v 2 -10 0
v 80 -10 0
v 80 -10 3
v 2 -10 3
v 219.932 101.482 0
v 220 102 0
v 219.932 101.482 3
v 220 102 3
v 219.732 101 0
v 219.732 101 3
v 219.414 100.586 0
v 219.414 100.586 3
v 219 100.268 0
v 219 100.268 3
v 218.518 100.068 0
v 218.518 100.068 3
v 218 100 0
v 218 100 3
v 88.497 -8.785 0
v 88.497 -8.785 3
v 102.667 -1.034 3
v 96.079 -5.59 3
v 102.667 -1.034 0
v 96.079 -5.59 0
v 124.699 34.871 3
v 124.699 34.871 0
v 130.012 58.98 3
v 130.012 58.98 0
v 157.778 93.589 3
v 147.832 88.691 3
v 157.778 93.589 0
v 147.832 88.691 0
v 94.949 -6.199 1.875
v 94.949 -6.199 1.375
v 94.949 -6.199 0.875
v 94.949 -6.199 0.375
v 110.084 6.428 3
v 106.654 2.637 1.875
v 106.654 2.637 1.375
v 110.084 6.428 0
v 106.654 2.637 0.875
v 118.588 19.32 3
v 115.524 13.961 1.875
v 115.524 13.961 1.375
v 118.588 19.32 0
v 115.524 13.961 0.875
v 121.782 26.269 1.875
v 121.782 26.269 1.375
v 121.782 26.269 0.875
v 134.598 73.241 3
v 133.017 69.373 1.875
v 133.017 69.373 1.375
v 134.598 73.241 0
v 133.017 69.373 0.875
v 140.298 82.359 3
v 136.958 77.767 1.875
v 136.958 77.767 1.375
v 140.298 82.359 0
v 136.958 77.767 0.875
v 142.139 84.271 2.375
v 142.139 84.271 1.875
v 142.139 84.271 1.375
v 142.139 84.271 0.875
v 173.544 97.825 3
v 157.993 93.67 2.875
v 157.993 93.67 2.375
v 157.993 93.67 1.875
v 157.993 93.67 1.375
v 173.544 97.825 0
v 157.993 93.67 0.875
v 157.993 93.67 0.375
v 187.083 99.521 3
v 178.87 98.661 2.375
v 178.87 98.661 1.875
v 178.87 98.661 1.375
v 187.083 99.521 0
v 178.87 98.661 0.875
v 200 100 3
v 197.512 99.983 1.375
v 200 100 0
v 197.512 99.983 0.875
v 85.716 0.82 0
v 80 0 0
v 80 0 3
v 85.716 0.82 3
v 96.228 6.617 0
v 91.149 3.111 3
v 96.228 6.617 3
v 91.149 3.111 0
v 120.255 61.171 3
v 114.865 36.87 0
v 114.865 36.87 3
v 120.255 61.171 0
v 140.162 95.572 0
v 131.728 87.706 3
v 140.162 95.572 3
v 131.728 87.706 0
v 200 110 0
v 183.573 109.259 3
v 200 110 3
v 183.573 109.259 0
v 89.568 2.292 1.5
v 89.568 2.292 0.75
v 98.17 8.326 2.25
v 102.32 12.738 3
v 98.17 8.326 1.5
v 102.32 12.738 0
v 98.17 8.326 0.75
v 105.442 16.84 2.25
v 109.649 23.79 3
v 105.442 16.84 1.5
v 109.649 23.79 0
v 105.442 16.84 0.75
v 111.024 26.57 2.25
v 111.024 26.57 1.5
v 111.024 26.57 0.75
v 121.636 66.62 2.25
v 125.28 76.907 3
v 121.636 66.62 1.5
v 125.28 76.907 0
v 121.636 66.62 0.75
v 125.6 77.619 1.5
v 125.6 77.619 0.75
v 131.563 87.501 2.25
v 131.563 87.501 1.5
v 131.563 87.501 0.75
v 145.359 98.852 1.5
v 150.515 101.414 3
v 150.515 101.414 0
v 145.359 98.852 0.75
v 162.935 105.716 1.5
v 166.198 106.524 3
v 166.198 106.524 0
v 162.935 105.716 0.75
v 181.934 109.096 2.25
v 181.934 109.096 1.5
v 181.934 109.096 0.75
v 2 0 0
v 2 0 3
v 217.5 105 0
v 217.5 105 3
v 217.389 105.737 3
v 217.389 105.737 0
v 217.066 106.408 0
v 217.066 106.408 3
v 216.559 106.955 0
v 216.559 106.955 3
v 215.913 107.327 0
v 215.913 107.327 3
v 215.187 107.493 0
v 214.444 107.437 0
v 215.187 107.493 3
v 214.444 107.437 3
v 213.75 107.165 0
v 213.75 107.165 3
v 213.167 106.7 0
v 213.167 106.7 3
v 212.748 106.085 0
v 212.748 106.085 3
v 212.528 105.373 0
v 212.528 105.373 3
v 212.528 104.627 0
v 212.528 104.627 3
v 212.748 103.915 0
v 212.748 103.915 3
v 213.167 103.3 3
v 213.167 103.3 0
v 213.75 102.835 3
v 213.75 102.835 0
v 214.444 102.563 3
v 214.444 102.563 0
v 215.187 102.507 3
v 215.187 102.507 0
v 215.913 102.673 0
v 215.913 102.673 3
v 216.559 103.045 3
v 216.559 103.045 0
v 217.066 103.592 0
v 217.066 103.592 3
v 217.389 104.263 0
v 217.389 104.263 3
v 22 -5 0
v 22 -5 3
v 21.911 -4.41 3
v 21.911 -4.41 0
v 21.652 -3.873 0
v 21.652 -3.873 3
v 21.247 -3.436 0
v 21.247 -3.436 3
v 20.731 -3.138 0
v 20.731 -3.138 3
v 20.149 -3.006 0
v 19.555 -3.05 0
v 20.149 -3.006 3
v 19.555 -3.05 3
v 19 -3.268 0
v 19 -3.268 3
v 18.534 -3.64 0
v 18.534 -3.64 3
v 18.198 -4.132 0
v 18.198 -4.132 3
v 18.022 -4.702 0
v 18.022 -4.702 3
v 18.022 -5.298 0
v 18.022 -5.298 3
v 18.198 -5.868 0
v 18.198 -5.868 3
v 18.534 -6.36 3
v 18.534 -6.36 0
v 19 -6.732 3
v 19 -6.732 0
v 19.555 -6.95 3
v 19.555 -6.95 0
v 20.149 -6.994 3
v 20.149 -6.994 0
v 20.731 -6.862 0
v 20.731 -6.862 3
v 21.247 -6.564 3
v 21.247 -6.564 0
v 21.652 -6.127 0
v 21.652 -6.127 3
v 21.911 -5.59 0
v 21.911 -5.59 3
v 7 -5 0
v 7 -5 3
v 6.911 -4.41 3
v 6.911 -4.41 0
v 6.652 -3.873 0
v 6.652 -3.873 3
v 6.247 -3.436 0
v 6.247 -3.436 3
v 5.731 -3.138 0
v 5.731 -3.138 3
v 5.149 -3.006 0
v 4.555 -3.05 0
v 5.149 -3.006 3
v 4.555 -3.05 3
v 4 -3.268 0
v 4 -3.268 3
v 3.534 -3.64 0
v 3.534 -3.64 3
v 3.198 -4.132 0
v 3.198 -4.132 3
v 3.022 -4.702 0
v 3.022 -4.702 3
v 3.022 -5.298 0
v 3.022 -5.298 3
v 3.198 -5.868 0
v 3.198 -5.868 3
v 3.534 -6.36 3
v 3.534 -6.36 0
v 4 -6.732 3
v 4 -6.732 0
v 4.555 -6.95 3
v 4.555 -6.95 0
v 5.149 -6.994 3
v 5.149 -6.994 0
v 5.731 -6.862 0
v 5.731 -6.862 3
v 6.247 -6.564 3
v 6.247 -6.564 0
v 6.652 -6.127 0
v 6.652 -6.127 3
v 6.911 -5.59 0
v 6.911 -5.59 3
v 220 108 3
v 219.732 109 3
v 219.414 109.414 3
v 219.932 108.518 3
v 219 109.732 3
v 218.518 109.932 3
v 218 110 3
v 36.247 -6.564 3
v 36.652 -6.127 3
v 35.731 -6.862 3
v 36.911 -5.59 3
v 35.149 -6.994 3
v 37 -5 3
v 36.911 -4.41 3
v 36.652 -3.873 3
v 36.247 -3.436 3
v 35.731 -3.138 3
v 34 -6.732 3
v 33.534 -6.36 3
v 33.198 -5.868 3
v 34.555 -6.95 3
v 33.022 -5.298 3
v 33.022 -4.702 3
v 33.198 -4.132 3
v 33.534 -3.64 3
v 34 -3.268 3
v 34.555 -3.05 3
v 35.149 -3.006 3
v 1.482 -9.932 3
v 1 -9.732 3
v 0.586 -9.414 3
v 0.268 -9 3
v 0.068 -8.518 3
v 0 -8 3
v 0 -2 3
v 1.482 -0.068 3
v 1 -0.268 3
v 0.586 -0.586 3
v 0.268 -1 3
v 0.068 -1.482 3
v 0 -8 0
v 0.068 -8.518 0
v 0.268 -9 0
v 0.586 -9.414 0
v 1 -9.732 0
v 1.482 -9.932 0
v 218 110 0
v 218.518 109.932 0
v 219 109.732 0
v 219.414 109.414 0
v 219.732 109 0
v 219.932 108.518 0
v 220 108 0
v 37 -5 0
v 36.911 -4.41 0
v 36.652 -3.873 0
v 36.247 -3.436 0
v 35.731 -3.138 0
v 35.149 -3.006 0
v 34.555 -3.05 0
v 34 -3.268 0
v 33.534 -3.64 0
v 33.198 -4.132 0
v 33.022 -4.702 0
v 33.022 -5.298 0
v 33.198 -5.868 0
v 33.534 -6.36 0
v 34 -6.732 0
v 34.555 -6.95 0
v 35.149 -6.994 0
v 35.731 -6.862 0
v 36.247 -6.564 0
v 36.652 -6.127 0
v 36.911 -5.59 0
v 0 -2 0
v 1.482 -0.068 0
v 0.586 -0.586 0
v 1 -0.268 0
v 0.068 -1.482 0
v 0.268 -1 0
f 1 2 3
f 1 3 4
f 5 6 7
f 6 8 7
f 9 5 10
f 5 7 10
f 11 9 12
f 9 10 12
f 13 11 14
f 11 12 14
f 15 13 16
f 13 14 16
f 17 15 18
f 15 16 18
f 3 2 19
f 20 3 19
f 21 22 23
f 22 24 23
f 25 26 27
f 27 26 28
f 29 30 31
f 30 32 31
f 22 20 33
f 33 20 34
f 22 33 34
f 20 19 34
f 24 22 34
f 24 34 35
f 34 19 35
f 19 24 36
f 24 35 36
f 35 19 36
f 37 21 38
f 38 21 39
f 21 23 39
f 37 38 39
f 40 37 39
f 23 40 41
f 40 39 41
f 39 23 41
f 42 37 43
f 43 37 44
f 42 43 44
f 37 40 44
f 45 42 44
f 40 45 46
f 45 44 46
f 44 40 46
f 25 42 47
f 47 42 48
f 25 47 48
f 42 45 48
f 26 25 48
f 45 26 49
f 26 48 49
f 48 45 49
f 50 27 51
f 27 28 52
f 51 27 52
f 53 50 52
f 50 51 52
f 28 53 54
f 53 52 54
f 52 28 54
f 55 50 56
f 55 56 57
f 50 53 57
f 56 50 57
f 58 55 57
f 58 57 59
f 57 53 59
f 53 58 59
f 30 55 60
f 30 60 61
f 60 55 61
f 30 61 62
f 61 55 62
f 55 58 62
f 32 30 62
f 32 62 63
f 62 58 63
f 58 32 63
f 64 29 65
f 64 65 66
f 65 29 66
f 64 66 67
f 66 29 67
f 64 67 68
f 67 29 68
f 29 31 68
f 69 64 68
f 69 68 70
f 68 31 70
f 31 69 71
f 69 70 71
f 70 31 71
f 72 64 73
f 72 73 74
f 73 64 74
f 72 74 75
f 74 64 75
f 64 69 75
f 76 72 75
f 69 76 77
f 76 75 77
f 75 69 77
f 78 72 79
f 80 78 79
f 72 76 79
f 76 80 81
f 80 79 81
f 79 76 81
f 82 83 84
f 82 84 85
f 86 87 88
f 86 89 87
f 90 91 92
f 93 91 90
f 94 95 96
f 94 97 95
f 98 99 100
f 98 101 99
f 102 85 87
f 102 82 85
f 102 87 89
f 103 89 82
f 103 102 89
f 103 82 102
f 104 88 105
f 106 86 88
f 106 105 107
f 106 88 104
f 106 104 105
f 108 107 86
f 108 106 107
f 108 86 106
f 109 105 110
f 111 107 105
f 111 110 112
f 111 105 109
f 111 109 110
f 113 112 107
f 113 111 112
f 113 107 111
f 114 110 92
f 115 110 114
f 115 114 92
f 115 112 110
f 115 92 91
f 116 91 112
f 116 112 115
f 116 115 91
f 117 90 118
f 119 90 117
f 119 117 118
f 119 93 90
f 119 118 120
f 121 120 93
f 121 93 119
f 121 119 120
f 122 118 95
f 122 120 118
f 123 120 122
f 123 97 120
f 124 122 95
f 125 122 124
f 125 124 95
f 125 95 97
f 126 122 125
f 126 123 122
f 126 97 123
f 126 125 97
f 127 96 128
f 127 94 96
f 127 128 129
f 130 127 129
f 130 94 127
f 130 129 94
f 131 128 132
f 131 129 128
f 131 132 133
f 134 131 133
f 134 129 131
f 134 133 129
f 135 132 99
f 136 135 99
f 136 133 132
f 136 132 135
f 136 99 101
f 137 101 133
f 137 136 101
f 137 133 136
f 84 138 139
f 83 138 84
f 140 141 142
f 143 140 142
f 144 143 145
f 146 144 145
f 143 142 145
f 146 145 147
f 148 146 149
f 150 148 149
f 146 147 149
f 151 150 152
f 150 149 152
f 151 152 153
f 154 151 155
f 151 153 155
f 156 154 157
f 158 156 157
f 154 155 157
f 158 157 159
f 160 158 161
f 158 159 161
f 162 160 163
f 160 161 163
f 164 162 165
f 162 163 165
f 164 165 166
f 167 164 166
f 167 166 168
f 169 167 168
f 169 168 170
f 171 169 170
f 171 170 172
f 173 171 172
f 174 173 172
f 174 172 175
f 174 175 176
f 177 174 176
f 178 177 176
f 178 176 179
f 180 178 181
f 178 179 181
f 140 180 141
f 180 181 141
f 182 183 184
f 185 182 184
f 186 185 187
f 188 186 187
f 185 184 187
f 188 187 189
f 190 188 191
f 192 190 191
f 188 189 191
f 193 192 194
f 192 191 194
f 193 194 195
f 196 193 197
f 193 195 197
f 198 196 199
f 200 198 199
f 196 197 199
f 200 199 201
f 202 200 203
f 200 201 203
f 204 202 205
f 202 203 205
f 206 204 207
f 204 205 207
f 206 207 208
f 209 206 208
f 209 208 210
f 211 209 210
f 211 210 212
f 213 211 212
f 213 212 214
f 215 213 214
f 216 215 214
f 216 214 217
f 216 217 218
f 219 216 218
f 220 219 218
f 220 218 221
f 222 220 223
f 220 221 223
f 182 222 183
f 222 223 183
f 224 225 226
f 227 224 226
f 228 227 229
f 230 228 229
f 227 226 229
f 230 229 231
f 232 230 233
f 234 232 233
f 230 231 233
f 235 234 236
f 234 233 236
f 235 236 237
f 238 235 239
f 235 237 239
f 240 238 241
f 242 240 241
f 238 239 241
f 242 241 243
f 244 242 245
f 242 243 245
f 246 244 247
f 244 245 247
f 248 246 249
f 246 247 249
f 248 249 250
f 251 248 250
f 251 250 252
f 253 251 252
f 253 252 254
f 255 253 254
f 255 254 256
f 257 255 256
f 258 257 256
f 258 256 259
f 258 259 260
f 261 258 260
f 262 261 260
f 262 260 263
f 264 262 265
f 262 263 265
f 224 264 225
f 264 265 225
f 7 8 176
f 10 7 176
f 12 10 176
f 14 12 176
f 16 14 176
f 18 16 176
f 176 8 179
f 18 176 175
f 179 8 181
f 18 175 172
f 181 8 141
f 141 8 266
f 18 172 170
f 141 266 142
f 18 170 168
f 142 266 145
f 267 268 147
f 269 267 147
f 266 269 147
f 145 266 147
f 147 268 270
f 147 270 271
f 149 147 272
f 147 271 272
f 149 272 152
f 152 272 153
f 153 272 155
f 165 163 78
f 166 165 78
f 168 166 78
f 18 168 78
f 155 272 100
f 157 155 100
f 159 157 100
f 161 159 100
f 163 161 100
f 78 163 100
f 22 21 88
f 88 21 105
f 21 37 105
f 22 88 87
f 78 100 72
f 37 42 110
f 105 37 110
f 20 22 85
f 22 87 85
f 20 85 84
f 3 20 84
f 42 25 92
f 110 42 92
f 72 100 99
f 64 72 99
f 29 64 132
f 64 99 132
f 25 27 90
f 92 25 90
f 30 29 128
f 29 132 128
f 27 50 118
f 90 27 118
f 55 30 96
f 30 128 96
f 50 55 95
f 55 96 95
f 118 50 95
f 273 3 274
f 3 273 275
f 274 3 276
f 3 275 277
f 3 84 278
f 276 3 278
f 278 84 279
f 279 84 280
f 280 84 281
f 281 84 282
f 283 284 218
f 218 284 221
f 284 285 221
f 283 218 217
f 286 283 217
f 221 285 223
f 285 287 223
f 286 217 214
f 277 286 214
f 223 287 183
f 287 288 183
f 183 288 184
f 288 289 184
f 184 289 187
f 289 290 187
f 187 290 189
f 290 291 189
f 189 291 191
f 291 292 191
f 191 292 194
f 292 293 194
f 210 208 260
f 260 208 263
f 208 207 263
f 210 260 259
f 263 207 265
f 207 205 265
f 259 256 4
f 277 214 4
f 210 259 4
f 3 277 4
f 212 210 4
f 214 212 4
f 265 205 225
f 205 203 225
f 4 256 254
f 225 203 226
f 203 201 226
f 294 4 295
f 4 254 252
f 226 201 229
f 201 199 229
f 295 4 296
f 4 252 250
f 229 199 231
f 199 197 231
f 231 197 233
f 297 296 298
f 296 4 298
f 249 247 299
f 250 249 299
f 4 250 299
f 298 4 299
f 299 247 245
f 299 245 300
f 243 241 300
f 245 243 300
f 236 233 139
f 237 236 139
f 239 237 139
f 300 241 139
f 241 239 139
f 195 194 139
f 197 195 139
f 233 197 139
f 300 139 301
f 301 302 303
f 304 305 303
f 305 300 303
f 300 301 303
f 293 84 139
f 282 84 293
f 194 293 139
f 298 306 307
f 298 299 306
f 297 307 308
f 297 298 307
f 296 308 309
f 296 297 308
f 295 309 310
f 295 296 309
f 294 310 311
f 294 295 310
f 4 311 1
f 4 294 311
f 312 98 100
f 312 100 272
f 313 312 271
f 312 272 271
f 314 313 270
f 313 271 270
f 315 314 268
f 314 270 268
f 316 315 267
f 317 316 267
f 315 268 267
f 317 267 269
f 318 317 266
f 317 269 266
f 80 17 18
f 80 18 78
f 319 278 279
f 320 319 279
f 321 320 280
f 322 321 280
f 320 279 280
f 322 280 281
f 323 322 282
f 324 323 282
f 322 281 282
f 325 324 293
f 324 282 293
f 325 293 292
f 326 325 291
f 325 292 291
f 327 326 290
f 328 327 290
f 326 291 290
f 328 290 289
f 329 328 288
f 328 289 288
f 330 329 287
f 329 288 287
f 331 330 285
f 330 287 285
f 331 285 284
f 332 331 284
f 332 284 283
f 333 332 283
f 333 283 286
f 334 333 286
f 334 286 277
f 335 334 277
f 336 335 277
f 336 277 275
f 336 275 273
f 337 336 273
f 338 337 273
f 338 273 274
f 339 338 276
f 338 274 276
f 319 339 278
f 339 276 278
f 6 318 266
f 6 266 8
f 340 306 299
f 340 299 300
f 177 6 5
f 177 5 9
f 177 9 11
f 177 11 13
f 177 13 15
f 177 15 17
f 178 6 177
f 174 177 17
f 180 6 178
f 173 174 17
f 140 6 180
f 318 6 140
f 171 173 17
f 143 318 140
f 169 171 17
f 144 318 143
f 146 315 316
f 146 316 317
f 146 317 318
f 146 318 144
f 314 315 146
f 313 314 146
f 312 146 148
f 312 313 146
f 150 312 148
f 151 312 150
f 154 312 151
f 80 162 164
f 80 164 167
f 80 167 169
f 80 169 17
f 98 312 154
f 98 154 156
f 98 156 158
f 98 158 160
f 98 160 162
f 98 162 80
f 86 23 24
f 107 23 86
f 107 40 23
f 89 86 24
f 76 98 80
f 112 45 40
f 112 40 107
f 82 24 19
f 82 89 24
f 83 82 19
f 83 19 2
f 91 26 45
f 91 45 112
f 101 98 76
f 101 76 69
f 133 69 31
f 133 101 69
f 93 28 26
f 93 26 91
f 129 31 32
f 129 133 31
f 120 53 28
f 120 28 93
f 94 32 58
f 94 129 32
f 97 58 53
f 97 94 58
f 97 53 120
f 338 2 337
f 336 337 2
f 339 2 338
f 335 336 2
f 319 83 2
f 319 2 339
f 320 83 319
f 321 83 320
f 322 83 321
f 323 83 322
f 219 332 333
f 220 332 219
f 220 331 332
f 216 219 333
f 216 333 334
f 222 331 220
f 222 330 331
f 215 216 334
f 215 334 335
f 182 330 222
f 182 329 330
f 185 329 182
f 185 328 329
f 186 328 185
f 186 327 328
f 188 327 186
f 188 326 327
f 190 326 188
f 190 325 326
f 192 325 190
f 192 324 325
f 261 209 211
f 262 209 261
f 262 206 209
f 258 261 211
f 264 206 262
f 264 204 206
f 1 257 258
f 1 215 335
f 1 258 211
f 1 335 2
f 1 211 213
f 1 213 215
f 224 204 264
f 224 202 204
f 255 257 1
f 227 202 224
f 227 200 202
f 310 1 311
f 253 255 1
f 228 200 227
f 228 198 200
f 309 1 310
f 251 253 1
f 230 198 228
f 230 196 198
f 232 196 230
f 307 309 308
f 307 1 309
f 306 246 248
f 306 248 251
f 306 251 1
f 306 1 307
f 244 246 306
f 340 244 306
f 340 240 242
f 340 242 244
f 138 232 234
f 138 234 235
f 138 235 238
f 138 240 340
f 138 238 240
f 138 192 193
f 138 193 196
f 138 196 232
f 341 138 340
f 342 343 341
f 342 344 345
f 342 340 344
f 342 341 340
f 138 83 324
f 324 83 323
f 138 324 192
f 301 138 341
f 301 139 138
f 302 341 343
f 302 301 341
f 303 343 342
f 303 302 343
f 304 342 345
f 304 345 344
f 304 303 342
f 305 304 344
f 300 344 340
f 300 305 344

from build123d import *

# Parameters (mm, degrees)
BOSS_EXTRUDE1_DEPTH = 3
SKETCH2_R           = 2.5
CUT_EXTRUDE1_DEPTH  = 3
SKETCH3_R           = 2
CUT_EXTRUDE2_DEPTH  = 3
FILLET1_R           = 2


with BuildPart() as part:
    # Sketch1 → Boss-Extrude1 (new body)
    with BuildSketch(Plane.XY):
        with BuildLine():
            Line((0, 0), (80, 0))
            add(Edge.make_bspline(
                [(80, 0), (93.241777409, 0), (116.662532156, 26.884378871), (118.223670956, 60.684196149), (136.379625173, 104.815244744), (177.581885357, 110), (200, 110)],
                knots=[0, 0, 0, 0, 0.230202035, 0.463699787, 0.593998921, 1, 1, 1, 1], degree=3))
            Line((200, 110), (220, 110))
            Line((220, 110), (220, 100))
            Line((220, 100), (200, 100))
            add(Edge.make_bspline(
                [(80, -10), (81.338450604, -10), (84.040299899, -9.814022301), (89.171948828, -8.773431689), (95.096140774, -6.397962571), (101.320848398, -2.351077717), (108.584153804, 4.16806824), (115.951573111, 13.793209278), (122.226980389, 26.353069456), (125.834100639, 38.407840745), (128.08688028, 49.634894484), (129.760964157, 58.23912359), (131.439150703, 64.711932829), (133.475999532, 70.987795966), (136.119804102, 76.709064997), (139.295139146, 81.312488332), (142.969844702, 85.310454179), (148.880794013, 89.705284662), (157.775180444, 93.859737882), (167.976748847, 96.877377019), (177.046331544, 98.492727447), (184.331013441, 99.319764785), (189.734131763, 99.730444252), (194.116725781, 99.918312291), (197.527693678, 99.988976604), (199.170669274, 100), (200, 100)],
                knots=[0, 0, 0, 0, 0.015625, 0.03125, 0.0625, 0.09375, 0.125, 0.1875, 0.25, 0.3125, 0.375, 0.4375, 0.46875, 0.5, 0.5625, 0.59375, 0.625, 0.6875, 0.75, 0.8125, 0.875, 0.90625, 0.9375, 0.96875, 0.984375, 1, 1, 1, 1], degree=3))
            Line((80, -10), (0, -10))
            Line((0, -10), (0, 0))
        make_face()
    extrude(amount=BOSS_EXTRUDE1_DEPTH)

    # Sketch2 → Cut-Extrude1 (cut)
    with BuildSketch(Plane.XY.offset(3)):
        with Locations((215, 105)):
            Circle(SKETCH2_R)
    extrude(amount=-CUT_EXTRUDE1_DEPTH, mode=Mode.SUBTRACT)

    # Sketch3 → Cut-Extrude2 (cut)
    with BuildSketch(Plane.XY.offset(3)):
        with Locations((5, -5)):
            Circle(SKETCH3_R)
        with Locations((20, -5)):
            Circle(SKETCH3_R)
        with Locations((35, -5)):
            Circle(SKETCH3_R)
    extrude(amount=-CUT_EXTRUDE2_DEPTH, mode=Mode.SUBTRACT)

    # Fillet1
    fillet1_edges = [part.edges().sort_by_distance(p)[0] for p in [
        (0, 0, 1.5),
        (0, -10, 1.5),
        (220, 100, 1.5),
        (220, 110, 1.5),
    ]]
    fillet(fillet1_edges, radius=FILLET1_R)


solid = part.part
